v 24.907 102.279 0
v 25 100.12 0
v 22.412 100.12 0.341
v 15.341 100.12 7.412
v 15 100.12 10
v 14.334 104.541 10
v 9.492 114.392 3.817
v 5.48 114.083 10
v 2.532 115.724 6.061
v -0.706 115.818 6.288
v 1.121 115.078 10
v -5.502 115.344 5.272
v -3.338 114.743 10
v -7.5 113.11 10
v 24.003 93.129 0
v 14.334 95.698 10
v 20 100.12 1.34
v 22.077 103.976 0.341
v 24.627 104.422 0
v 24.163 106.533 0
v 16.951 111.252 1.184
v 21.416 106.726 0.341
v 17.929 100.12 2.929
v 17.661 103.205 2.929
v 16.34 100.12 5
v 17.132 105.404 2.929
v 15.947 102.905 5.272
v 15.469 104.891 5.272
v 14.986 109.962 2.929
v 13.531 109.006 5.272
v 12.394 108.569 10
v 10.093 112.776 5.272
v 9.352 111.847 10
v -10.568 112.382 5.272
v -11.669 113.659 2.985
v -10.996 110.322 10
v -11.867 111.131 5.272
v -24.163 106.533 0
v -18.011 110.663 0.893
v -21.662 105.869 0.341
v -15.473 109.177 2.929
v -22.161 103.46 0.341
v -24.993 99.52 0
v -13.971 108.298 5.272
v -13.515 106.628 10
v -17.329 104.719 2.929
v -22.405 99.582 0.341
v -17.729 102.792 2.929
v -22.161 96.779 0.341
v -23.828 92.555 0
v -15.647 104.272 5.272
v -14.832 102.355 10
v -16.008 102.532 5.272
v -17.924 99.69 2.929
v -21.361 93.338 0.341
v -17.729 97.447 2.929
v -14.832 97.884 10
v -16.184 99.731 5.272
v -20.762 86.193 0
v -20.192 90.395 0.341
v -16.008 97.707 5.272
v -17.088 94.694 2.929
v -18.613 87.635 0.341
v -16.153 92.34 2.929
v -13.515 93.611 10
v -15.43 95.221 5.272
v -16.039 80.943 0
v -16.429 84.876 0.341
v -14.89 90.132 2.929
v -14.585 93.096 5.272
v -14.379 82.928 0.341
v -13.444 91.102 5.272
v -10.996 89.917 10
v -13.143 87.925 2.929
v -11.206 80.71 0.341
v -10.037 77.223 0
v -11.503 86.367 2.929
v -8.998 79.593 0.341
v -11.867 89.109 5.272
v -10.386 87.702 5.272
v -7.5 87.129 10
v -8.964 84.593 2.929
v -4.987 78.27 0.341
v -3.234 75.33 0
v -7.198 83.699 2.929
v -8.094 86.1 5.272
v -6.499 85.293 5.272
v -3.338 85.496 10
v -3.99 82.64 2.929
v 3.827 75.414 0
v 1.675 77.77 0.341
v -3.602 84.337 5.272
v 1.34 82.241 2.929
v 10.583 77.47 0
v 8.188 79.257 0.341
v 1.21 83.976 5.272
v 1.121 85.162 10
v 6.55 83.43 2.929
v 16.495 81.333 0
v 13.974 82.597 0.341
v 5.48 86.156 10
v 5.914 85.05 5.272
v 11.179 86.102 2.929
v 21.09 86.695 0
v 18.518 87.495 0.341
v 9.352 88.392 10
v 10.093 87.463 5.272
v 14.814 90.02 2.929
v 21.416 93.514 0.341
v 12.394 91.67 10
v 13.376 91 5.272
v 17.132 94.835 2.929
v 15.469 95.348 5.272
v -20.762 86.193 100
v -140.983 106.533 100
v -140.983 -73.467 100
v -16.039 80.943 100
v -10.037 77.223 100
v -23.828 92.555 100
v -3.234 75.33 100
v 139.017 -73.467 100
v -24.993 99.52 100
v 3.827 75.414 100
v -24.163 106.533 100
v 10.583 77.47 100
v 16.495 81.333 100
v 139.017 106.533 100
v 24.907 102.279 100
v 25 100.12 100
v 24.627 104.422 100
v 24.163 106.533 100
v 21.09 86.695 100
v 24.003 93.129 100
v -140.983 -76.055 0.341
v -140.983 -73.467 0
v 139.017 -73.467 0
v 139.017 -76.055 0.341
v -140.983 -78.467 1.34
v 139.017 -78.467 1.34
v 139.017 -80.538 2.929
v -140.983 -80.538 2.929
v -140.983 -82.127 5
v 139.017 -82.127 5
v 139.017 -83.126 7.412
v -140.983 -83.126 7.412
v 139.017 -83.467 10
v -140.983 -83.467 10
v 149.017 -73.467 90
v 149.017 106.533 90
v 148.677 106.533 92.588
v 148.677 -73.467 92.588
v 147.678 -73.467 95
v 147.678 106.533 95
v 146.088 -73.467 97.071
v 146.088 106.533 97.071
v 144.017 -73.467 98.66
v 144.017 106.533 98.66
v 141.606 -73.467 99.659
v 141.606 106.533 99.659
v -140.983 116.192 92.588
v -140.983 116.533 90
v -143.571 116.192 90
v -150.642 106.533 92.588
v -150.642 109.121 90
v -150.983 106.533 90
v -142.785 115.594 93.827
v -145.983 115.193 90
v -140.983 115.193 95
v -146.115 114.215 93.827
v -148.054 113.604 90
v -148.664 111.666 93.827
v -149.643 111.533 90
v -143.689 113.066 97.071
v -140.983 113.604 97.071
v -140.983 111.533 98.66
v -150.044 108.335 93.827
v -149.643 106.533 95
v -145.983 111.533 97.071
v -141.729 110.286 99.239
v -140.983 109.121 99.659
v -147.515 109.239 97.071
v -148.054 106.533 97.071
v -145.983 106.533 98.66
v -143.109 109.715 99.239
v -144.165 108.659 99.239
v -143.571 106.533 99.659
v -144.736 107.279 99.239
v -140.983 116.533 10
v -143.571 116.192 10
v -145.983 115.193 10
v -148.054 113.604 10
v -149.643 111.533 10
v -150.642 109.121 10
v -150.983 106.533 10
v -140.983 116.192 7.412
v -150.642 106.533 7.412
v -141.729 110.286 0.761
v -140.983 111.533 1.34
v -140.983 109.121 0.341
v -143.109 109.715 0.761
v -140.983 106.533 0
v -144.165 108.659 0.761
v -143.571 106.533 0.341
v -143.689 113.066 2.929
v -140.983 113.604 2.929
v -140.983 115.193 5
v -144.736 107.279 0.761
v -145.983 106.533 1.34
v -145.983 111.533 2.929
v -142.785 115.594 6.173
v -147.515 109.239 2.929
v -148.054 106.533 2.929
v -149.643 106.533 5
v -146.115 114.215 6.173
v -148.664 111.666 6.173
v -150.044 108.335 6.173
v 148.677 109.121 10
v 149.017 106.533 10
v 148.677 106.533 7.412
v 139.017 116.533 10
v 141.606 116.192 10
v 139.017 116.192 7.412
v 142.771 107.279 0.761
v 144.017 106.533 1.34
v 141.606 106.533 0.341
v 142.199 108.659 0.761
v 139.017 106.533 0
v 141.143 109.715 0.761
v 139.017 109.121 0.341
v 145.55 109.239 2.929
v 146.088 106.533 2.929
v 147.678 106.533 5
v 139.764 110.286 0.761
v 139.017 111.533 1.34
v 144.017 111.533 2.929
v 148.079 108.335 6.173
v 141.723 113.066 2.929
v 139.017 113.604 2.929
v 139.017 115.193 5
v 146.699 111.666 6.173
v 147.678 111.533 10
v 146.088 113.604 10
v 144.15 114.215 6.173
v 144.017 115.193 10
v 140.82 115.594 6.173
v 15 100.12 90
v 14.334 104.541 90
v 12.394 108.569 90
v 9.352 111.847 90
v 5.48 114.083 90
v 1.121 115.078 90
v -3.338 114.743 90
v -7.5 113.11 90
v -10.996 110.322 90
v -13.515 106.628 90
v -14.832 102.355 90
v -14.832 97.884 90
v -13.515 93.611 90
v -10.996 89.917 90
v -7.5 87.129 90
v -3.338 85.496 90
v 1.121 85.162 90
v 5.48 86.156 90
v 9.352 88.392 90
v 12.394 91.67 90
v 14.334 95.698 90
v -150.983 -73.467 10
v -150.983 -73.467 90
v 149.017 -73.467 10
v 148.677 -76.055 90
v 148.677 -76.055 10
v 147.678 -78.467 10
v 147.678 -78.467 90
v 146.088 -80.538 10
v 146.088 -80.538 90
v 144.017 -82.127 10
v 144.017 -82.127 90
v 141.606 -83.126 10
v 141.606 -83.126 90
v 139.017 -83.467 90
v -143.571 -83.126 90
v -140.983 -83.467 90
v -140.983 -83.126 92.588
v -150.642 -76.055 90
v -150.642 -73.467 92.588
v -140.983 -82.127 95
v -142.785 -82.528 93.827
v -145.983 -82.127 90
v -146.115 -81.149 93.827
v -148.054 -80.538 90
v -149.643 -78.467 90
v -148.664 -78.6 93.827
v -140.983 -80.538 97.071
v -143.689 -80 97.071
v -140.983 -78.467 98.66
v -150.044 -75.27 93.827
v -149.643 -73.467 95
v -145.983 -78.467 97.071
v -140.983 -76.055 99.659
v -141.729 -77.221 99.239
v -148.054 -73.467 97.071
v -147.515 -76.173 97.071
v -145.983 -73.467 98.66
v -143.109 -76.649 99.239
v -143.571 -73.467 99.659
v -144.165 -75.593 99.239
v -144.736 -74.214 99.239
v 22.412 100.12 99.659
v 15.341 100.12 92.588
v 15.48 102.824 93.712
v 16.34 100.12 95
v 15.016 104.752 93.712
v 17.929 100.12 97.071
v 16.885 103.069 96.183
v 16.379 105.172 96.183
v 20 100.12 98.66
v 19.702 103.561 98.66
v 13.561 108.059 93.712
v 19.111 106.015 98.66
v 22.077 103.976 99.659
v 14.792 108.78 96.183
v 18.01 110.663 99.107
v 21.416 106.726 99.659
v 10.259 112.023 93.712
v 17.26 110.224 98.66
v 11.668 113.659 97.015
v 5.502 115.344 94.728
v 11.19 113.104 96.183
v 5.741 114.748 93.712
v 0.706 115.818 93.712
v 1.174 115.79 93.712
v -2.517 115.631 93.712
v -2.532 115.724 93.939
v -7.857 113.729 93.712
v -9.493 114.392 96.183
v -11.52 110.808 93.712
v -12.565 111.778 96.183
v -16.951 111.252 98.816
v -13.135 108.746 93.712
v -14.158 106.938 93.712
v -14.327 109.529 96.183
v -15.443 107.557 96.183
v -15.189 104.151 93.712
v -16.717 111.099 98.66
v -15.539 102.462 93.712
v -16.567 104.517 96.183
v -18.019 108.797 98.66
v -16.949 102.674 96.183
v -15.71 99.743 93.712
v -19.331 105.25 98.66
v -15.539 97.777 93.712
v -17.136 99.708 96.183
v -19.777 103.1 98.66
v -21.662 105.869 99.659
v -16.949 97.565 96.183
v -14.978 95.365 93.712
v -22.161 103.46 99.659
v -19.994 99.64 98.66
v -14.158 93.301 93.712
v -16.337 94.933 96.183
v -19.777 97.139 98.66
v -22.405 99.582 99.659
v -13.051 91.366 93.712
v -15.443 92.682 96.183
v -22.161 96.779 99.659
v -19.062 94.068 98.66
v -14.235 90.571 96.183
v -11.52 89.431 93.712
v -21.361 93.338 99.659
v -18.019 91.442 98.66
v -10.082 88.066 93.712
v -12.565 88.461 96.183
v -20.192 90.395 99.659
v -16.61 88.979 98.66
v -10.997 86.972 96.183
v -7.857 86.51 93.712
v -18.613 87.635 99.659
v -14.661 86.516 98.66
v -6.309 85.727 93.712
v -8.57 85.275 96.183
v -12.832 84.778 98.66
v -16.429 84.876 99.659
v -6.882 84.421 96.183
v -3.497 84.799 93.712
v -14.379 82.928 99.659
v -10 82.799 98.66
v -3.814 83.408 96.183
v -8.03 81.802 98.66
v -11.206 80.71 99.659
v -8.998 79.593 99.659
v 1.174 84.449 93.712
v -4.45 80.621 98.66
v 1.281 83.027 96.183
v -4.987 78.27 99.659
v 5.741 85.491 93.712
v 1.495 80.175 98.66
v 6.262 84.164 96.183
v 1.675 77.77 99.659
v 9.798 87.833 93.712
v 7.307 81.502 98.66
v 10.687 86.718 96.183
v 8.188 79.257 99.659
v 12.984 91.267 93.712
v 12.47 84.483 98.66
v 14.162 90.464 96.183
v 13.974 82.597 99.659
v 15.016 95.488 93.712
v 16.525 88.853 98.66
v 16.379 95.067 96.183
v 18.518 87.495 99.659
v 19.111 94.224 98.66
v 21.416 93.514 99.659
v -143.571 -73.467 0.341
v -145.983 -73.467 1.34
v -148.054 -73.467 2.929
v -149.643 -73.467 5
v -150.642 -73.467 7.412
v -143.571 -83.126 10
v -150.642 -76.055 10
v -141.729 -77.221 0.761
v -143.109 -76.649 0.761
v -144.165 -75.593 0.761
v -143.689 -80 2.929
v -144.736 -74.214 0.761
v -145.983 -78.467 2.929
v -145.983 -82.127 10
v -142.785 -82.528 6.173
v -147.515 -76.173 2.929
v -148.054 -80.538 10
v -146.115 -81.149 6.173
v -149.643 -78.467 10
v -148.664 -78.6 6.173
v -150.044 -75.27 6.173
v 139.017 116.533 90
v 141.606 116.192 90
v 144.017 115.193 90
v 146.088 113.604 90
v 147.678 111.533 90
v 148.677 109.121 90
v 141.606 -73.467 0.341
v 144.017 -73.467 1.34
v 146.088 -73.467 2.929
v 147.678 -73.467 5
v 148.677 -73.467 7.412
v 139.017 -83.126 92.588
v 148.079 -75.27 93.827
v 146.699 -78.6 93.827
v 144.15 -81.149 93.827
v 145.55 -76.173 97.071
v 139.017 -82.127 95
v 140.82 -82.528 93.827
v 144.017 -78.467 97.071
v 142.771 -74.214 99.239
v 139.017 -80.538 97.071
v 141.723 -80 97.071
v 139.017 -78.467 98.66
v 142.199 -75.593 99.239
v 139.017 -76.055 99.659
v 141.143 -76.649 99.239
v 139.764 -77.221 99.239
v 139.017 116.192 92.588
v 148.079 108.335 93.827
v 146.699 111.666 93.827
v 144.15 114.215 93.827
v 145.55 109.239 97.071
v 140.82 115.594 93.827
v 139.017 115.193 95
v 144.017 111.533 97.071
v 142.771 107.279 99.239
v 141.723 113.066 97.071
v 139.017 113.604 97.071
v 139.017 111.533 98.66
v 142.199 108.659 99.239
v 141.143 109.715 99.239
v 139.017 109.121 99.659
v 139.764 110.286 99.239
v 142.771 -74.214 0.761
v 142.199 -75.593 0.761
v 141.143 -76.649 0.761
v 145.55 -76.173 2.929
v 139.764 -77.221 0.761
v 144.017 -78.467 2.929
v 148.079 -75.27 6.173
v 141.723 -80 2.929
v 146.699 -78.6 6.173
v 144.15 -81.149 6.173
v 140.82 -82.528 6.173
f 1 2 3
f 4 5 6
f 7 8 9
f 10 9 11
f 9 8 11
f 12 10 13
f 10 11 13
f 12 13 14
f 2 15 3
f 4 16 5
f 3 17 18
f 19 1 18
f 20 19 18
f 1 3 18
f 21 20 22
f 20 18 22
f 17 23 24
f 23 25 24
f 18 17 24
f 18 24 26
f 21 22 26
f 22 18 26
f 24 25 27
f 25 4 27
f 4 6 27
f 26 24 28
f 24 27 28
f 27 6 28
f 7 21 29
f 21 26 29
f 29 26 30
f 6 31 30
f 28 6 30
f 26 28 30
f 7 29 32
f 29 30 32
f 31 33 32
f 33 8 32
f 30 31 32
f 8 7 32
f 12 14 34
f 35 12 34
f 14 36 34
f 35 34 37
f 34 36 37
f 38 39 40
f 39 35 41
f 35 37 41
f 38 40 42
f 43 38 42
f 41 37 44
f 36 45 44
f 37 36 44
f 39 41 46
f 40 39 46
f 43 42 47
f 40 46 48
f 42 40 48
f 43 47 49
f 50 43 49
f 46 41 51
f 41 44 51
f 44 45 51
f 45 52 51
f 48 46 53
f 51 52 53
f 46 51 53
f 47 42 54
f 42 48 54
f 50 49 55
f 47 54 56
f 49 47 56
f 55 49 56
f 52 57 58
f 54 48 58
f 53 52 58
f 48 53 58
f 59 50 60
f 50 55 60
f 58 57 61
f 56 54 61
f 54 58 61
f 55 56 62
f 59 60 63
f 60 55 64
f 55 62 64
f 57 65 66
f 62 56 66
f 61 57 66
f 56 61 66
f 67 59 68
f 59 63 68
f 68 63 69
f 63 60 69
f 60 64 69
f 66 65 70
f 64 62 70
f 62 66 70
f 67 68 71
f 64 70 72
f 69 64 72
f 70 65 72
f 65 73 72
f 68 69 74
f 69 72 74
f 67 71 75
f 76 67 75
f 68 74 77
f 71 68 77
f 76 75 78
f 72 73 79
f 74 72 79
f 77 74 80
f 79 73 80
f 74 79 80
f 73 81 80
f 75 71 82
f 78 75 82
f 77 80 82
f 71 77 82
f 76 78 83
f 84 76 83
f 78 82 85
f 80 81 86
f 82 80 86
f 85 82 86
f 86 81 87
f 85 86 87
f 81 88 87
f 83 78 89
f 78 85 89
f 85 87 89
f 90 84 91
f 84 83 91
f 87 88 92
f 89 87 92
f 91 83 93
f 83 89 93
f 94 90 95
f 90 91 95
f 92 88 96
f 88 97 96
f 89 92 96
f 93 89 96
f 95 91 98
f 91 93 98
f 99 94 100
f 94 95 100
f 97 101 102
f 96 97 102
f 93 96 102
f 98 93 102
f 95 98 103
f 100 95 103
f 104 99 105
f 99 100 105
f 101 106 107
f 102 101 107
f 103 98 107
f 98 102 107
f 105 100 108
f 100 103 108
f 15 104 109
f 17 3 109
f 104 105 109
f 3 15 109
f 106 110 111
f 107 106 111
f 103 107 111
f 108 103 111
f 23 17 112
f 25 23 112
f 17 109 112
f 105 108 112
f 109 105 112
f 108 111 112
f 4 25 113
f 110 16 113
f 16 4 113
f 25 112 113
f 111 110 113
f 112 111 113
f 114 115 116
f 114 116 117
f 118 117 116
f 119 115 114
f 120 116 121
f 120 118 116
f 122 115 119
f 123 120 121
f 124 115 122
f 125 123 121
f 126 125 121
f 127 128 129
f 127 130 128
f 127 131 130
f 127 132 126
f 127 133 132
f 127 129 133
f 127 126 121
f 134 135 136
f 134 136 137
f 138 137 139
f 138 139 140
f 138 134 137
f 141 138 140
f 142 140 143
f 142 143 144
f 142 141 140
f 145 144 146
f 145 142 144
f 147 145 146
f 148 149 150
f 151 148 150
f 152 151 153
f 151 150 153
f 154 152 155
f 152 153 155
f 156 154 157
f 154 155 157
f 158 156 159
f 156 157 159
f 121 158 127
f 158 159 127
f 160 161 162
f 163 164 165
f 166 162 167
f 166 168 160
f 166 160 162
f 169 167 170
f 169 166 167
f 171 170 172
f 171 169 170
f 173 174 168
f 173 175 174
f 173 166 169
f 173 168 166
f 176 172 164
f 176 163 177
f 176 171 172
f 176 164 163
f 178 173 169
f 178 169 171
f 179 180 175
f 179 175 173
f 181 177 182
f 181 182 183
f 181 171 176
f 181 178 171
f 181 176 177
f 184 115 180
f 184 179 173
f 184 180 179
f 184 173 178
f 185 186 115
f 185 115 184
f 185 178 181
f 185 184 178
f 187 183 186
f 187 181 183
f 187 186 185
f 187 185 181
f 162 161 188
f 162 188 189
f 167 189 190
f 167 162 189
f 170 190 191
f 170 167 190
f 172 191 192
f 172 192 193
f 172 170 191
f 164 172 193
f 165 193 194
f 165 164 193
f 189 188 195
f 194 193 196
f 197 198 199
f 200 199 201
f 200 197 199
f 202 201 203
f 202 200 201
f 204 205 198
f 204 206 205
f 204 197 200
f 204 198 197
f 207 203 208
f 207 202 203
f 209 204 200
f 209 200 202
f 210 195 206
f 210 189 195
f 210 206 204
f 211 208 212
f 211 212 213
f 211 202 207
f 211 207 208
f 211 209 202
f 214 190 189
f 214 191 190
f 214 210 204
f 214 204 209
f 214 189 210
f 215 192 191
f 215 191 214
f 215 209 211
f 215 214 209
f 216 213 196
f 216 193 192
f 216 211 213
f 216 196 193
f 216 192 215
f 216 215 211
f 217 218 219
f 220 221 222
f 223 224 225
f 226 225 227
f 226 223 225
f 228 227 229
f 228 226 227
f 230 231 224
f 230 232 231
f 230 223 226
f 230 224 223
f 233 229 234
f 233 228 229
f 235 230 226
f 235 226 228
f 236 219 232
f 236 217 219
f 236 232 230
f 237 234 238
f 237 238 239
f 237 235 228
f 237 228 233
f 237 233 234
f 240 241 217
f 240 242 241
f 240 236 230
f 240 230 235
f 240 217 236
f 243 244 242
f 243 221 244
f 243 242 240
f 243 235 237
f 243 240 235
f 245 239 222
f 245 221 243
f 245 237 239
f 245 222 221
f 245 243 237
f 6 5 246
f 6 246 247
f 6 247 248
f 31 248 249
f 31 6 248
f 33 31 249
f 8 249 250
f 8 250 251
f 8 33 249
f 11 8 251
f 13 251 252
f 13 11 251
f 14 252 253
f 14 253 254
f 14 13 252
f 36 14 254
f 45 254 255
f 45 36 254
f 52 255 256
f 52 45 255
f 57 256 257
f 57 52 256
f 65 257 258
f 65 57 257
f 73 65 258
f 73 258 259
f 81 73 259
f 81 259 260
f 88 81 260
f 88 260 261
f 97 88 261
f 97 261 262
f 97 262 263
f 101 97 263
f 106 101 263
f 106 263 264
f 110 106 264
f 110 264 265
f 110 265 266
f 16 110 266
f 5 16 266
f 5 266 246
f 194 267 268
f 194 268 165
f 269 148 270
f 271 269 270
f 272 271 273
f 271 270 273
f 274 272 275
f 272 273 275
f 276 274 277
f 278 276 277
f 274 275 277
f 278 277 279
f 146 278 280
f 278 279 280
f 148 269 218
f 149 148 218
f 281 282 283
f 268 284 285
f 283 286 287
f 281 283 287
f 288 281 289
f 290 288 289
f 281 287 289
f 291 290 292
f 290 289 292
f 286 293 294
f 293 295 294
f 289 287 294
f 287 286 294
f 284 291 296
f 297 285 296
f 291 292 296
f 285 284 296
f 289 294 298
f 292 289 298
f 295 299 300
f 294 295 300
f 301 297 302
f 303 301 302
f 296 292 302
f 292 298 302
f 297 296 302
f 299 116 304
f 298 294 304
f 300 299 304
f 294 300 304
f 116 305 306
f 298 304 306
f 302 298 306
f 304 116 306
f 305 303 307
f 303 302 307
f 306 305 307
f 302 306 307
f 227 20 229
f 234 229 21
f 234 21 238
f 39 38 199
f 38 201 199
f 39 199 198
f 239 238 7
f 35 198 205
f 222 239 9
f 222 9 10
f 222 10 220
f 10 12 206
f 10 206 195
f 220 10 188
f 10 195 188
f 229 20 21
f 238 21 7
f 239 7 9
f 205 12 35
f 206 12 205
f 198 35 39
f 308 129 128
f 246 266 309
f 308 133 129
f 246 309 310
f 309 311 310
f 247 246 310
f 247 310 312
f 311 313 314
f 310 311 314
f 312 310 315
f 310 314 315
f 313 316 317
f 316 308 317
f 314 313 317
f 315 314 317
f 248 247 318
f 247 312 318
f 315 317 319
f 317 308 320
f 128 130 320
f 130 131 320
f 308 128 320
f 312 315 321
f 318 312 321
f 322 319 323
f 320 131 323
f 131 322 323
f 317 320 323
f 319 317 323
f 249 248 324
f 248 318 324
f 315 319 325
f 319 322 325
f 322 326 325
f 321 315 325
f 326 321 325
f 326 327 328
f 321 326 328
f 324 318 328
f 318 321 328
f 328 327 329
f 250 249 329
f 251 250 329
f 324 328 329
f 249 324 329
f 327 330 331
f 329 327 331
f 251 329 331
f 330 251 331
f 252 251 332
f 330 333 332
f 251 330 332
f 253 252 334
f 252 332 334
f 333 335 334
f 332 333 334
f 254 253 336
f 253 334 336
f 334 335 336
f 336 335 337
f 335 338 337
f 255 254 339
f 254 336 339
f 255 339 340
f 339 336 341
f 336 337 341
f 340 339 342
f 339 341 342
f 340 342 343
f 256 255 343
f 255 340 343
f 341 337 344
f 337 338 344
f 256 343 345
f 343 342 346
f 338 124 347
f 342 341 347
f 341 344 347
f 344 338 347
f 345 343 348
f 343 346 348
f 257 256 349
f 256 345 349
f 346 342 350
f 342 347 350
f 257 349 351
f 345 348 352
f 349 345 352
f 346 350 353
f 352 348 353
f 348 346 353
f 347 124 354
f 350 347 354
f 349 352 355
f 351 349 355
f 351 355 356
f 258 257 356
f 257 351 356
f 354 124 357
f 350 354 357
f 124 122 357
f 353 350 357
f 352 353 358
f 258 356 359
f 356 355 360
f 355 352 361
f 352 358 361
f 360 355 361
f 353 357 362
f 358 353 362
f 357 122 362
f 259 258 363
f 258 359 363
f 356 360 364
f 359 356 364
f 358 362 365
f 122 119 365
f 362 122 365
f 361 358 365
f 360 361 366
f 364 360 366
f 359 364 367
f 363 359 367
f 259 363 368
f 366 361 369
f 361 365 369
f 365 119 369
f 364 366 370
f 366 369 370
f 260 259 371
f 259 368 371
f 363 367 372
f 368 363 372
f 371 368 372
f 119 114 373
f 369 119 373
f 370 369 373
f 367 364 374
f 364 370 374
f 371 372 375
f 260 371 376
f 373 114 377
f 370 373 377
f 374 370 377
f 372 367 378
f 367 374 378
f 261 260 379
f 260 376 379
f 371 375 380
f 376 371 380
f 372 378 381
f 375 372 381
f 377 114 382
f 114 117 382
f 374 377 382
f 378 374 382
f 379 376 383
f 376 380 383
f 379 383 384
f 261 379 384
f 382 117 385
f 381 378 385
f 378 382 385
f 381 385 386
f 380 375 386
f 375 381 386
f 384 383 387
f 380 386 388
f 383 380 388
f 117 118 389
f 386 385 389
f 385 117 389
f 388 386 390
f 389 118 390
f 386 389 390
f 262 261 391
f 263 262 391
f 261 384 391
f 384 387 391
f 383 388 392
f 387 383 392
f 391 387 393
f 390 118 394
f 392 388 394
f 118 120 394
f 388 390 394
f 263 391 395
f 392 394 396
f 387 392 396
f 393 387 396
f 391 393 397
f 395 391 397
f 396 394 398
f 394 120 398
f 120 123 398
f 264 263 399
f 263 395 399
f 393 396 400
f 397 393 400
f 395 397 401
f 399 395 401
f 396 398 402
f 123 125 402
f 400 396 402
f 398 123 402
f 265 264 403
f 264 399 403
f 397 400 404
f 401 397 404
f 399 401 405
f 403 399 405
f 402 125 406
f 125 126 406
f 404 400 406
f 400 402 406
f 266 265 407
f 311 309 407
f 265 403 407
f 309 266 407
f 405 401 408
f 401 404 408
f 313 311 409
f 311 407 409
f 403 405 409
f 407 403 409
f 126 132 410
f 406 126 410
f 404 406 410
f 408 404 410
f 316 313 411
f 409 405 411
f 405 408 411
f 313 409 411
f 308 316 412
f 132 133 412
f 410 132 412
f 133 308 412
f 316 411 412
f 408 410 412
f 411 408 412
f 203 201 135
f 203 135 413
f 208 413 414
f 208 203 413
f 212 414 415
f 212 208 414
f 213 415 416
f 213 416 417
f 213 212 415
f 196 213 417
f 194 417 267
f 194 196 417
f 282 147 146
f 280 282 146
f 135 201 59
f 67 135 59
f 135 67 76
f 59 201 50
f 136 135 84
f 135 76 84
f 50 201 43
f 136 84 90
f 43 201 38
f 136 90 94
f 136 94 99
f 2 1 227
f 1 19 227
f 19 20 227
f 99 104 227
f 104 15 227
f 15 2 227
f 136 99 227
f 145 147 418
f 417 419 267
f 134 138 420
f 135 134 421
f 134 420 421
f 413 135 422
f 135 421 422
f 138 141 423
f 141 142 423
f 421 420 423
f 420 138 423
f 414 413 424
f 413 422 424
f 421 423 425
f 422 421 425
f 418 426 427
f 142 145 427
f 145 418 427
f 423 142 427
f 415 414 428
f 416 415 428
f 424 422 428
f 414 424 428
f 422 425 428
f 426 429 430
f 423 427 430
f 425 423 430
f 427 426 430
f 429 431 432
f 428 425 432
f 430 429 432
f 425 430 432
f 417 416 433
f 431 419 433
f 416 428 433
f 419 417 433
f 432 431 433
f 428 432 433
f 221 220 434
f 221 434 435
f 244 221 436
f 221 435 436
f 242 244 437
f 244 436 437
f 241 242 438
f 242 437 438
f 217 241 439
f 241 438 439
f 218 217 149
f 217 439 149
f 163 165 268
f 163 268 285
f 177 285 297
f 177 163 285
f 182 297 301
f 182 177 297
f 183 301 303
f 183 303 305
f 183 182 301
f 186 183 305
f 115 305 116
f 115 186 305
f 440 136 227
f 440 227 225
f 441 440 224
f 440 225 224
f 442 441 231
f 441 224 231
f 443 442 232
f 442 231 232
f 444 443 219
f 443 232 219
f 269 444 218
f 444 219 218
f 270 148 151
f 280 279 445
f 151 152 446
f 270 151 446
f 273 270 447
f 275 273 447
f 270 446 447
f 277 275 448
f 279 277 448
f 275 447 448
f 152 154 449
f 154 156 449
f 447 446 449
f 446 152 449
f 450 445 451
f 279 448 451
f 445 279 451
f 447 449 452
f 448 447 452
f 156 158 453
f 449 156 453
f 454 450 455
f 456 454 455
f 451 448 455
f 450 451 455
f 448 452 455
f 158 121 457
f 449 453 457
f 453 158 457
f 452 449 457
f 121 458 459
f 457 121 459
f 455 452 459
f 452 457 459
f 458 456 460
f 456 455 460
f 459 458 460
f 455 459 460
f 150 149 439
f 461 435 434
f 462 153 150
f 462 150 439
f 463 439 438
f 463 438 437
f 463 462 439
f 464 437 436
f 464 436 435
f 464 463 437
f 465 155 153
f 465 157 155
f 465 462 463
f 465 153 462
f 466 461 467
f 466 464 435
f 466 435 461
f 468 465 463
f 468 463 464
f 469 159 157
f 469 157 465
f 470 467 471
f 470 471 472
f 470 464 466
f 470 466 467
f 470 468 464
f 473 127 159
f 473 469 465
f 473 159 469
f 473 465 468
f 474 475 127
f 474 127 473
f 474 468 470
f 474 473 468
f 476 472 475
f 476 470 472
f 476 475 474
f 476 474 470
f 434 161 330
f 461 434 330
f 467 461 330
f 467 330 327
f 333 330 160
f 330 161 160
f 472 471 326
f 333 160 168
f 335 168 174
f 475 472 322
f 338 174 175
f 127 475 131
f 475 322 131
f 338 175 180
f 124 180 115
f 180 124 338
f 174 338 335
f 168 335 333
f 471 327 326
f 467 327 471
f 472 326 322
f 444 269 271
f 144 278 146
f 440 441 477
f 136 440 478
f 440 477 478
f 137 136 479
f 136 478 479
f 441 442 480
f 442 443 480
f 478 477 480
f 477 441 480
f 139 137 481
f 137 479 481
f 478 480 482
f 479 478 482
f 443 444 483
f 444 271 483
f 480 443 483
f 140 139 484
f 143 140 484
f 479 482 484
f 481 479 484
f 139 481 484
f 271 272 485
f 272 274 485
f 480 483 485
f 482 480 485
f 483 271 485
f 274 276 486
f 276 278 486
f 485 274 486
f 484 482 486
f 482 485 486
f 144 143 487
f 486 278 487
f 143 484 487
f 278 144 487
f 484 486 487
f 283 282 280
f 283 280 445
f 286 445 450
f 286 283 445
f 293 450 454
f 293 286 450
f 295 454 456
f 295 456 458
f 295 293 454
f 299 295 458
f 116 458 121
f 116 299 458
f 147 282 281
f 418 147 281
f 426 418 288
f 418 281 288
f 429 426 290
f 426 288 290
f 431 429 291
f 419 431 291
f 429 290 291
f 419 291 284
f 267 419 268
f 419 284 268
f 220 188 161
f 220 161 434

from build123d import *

# Parameters (mm, degrees)
F0_W         = 300
F0_H         = 200
F0_R         = 15
F1_DEPTH     = 100
F2_R         = 10
F3_R         = 10
F4_R         = 10
F5_R         = 10
F6_T1_DEPTH  = 280
F6_T3_DEPTH  = 180
F6_T6_ANGLE  = 90
F6_T8_ANGLE  = 90
F6_T10_ANGLE = 90
F6_T12_ANGLE = 90
F7_T1_DEPTH  = 280
F7_T3_DEPTH  = 180
F7_T6_ANGLE  = 90
F7_T8_ANGLE  = 90
F7_T10_ANGLE = 90
F7_T12_ANGLE = 90


# Not quite as in the source:
# - a fillet or chamfer that OpenCascade refuses, or shapes differently, is made with other operations: its cross-section is extruded or revolved along the edge and cut away or added


with BuildPart() as f1:
    # F0 (on Top) → F1 (new body)
    with BuildSketch(Plane.XY):
        with Locations((-0.982619822, 16.5327907399)):
            Rectangle(F0_W, F0_H)
        with Locations((0, 100.119560957)):
            Circle(F0_R, mode=Mode.SUBTRACT)
    extrude(amount=F1_DEPTH)

    # F2
    f2_edges = [f1.edges().sort_by_distance(p)[0] for p in [
        (149.01738, 116.532791, 50),
    ]]
    fillet(f2_edges, radius=F2_R)

    # F3
    f3_edges = [f1.edges().sort_by_distance(p)[0] for p in [
        (-150.98262, 116.532791, 50),
    ]]
    fillet(f3_edges, radius=F3_R)

    # F4
    f4_edges = [f1.edges().sort_by_distance(p)[0] for p in [
        (149.01738, -83.467209, 50),
    ]]
    fillet(f4_edges, radius=F4_R)

    # F5
    f5_edges = [f1.edges().sort_by_distance(p)[0] for p in [
        (-150.98262, -83.467209, 50),
    ]]
    fillet(f5_edges, radius=F5_R)

    # F6: fillet of radius 10 on 9 edges, made by hand

    # F6_s2 → F6_t1 (cut)
    with BuildSketch(Plane.YZ.offset(-140.982619822)):
        with BuildLine():
            ThreePointArc((-83.4672092601, 90), (-80.538277072, 97.0710678119), (-73.4672092601, 100))
            Line((-73.4672092601, 100), (-83.4672092601, 100))
            Line((-83.4672092601, 100), (-83.4672092601, 90))
        make_face()
        with BuildLine():
            ThreePointArc((116.5327907399, 90), (113.6038585518, 97.0710678119), (106.5327907399, 100))
            Line((106.5327907399, 100), (116.5327907399, 100))
            Line((116.5327907399, 100), (116.5327907399, 90))
        make_face()
    extrude(amount=F6_T1_DEPTH, mode=Mode.SUBTRACT)

    # F6_s4 → F6_t3 (cut)
    with BuildSketch(Plane.XZ.offset(-106.5327907399)):
        with BuildLine():
            ThreePointArc((-150.982619822, 90), (-148.0536876339, 97.0710678119), (-140.982619822, 100))
            Line((-140.982619822, 100), (-150.982619822, 100))
            Line((-150.982619822, 100), (-150.982619822, 90))
        make_face()
        with BuildLine():
            ThreePointArc((149.017380178, 90), (146.0884479898, 97.0710678119), (139.017380178, 100))
            Line((139.017380178, 100), (149.017380178, 100))
            Line((149.017380178, 100), (149.017380178, 90))
        make_face()
    extrude(amount=F6_T3_DEPTH, mode=Mode.SUBTRACT)

    # F6_s5 → F6_t6 (revolve, cut)
    with BuildSketch(Plane.YZ.offset(-140.982619822)):
        with BuildLine():
            ThreePointArc((-83.4672092601, 90), (-80.538277072, 97.0710678119), (-73.4672092601, 100))
            Line((-73.4672092601, 100), (-83.4672092601, 100))
            Line((-83.4672092601, 100), (-83.4672092601, 90))
        make_face()
    revolve(axis=Axis((-140.982619822, -73.4672092601, 100), (0, 0, -1)), revolution_arc=F6_T6_ANGLE, mode=Mode.SUBTRACT)

    # F6_s7 → F6_t8 (revolve, cut)
    with BuildSketch(Plane.XZ.offset(73.4672092601)):
        with BuildLine():
            ThreePointArc((149.017380178, 90), (146.0884479898, 97.0710678119), (139.017380178, 100))
            Line((139.017380178, 100), (149.017380178, 100))
            Line((149.017380178, 100), (149.017380178, 90))
        make_face()
    revolve(axis=Axis((139.017380178, -73.4672092601, 100), (0, 0, -1)), revolution_arc=F6_T8_ANGLE, mode=Mode.SUBTRACT)

    # F6_s9 → F6_t10 (revolve, cut)
    with BuildSketch(Plane.YZ.offset(-140.982619822)):
        with BuildLine():
            ThreePointArc((116.5327907399, 90), (113.6038585518, 97.0710678119), (106.5327907399, 100))
            Line((106.5327907399, 100), (116.5327907399, 100))
            Line((116.5327907399, 100), (116.5327907399, 90))
        make_face()
    revolve(axis=Axis((-140.982619822, 106.5327907399, 100), (0, 0, 1)), revolution_arc=F6_T10_ANGLE, mode=Mode.SUBTRACT)

    # F6_s11 → F6_t12 (revolve, cut)
    with BuildSketch(Plane.XZ.offset(-106.5327907399)):
        with BuildLine():
            ThreePointArc((149.017380178, 90), (146.0884479898, 97.0710678119), (139.017380178, 100))
            Line((139.017380178, 100), (149.017380178, 100))
            Line((149.017380178, 100), (149.017380178, 90))
        make_face()
    revolve(axis=Axis((139.017380178, 106.5327907399, 100), (0, 0, 1)), revolution_arc=F6_T12_ANGLE, mode=Mode.SUBTRACT)

    # F6_s13 → F6_t14 (revolve, cut)
    with BuildSketch(Plane.XZ.offset(-100.119560957)):
        with BuildLine():
            ThreePointArc((15, 90), (17.9289321881, 97.0710678119), (25, 100))
            Line((25, 100), (15, 100))
            Line((15, 100), (15, 90))
        make_face()
    revolve(axis=Axis((0, 100.119560957, 100), (0, 0, 1)), mode=Mode.SUBTRACT)

    # F7: fillet of radius 10 on 9 edges, made by hand

    # F7_s2 → F7_t1 (cut)
    with BuildSketch(Plane.YZ.offset(-140.982619822)):
        with BuildLine():
            ThreePointArc((-73.4672092601, 0), (-80.538277072, 2.9289321881), (-83.4672092601, 10))
            Line((-83.4672092601, 10), (-83.4672092601, 0))
            Line((-83.4672092601, 0), (-73.4672092601, 0))
        make_face()
        with BuildLine():
            ThreePointArc((106.5327907399, 0), (113.6038585518, 2.9289321881), (116.5327907399, 10))
            Line((116.5327907399, 10), (116.5327907399, 0))
            Line((116.5327907399, 0), (106.5327907399, 0))
        make_face()
    extrude(amount=F7_T1_DEPTH, mode=Mode.SUBTRACT)

    # F7_s4 → F7_t3 (cut)
    with BuildSketch(Plane.XZ.offset(-106.5327907399)):
        with BuildLine():
            ThreePointArc((-140.982619822, 0), (-148.0536876339, 2.9289321881), (-150.982619822, 10))
            Line((-150.982619822, 10), (-150.982619822, 0))
            Line((-150.982619822, 0), (-140.982619822, 0))
        make_face()
        with BuildLine():
            ThreePointArc((139.017380178, 0), (146.0884479898, 2.9289321881), (149.017380178, 10))
            Line((149.017380178, 10), (149.017380178, 0))
            Line((149.017380178, 0), (139.017380178, 0))
        make_face()
    extrude(amount=F7_T3_DEPTH, mode=Mode.SUBTRACT)

    # F7_s5 → F7_t6 (revolve, cut)
    with BuildSketch(Plane.YZ.offset(-140.982619822)):
        with BuildLine():
            ThreePointArc((-73.4672092601, 0), (-80.538277072, 2.9289321881), (-83.4672092601, 10))
            Line((-83.4672092601, 10), (-83.4672092601, 0))
            Line((-83.4672092601, 0), (-73.4672092601, 0))
        make_face()
    revolve(axis=Axis((-140.982619822, -73.4672092601, 0), (0, 0, -1)), revolution_arc=F7_T6_ANGLE, mode=Mode.SUBTRACT)

    # F7_s7 → F7_t8 (revolve, cut)
    with BuildSketch(Plane.XZ.offset(73.4672092601)):
        with BuildLine():
            ThreePointArc((139.017380178, 0), (146.0884479898, 2.9289321881), (149.017380178, 10))
            Line((149.017380178, 10), (149.017380178, 0))
            Line((149.017380178, 0), (139.017380178, 0))
        make_face()
    revolve(axis=Axis((139.017380178, -73.4672092601, 0), (0, 0, -1)), revolution_arc=F7_T8_ANGLE, mode=Mode.SUBTRACT)

    # F7_s9 → F7_t10 (revolve, cut)
    with BuildSketch(Plane.YZ.offset(-140.982619822)):
        with BuildLine():
            ThreePointArc((106.5327907399, 0), (113.6038585518, 2.9289321881), (116.5327907399, 10))
            Line((116.5327907399, 10), (116.5327907399, 0))
            Line((116.5327907399, 0), (106.5327907399, 0))
        make_face()
    revolve(axis=Axis((-140.982619822, 106.5327907399, 0), (0, 0, 1)), revolution_arc=F7_T10_ANGLE, mode=Mode.SUBTRACT)

    # F7_s11 → F7_t12 (revolve, cut)
    with BuildSketch(Plane.XZ.offset(-106.5327907399)):
        with BuildLine():
            ThreePointArc((139.017380178, 0), (146.0884479898, 2.9289321881), (149.017380178, 10))
            Line((149.017380178, 10), (149.017380178, 0))
            Line((149.017380178, 0), (139.017380178, 0))
        make_face()
    revolve(axis=Axis((139.017380178, 106.5327907399, 0), (0, 0, 1)), revolution_arc=F7_T12_ANGLE, mode=Mode.SUBTRACT)

    # F7_s13 → F7_t14 (revolve, cut)
    with BuildSketch(Plane.XZ.offset(-100.119560957)):
        with BuildLine():
            ThreePointArc((25, 0), (17.9289321881, 2.9289321881), (15, 10))
            Line((15, 10), (15, 0))
            Line((15, 0), (25, 0))
        make_face()
    revolve(axis=Axis((0, 100.119560957, 0), (0, 0, 1)), mode=Mode.SUBTRACT)


solid = f1.part
